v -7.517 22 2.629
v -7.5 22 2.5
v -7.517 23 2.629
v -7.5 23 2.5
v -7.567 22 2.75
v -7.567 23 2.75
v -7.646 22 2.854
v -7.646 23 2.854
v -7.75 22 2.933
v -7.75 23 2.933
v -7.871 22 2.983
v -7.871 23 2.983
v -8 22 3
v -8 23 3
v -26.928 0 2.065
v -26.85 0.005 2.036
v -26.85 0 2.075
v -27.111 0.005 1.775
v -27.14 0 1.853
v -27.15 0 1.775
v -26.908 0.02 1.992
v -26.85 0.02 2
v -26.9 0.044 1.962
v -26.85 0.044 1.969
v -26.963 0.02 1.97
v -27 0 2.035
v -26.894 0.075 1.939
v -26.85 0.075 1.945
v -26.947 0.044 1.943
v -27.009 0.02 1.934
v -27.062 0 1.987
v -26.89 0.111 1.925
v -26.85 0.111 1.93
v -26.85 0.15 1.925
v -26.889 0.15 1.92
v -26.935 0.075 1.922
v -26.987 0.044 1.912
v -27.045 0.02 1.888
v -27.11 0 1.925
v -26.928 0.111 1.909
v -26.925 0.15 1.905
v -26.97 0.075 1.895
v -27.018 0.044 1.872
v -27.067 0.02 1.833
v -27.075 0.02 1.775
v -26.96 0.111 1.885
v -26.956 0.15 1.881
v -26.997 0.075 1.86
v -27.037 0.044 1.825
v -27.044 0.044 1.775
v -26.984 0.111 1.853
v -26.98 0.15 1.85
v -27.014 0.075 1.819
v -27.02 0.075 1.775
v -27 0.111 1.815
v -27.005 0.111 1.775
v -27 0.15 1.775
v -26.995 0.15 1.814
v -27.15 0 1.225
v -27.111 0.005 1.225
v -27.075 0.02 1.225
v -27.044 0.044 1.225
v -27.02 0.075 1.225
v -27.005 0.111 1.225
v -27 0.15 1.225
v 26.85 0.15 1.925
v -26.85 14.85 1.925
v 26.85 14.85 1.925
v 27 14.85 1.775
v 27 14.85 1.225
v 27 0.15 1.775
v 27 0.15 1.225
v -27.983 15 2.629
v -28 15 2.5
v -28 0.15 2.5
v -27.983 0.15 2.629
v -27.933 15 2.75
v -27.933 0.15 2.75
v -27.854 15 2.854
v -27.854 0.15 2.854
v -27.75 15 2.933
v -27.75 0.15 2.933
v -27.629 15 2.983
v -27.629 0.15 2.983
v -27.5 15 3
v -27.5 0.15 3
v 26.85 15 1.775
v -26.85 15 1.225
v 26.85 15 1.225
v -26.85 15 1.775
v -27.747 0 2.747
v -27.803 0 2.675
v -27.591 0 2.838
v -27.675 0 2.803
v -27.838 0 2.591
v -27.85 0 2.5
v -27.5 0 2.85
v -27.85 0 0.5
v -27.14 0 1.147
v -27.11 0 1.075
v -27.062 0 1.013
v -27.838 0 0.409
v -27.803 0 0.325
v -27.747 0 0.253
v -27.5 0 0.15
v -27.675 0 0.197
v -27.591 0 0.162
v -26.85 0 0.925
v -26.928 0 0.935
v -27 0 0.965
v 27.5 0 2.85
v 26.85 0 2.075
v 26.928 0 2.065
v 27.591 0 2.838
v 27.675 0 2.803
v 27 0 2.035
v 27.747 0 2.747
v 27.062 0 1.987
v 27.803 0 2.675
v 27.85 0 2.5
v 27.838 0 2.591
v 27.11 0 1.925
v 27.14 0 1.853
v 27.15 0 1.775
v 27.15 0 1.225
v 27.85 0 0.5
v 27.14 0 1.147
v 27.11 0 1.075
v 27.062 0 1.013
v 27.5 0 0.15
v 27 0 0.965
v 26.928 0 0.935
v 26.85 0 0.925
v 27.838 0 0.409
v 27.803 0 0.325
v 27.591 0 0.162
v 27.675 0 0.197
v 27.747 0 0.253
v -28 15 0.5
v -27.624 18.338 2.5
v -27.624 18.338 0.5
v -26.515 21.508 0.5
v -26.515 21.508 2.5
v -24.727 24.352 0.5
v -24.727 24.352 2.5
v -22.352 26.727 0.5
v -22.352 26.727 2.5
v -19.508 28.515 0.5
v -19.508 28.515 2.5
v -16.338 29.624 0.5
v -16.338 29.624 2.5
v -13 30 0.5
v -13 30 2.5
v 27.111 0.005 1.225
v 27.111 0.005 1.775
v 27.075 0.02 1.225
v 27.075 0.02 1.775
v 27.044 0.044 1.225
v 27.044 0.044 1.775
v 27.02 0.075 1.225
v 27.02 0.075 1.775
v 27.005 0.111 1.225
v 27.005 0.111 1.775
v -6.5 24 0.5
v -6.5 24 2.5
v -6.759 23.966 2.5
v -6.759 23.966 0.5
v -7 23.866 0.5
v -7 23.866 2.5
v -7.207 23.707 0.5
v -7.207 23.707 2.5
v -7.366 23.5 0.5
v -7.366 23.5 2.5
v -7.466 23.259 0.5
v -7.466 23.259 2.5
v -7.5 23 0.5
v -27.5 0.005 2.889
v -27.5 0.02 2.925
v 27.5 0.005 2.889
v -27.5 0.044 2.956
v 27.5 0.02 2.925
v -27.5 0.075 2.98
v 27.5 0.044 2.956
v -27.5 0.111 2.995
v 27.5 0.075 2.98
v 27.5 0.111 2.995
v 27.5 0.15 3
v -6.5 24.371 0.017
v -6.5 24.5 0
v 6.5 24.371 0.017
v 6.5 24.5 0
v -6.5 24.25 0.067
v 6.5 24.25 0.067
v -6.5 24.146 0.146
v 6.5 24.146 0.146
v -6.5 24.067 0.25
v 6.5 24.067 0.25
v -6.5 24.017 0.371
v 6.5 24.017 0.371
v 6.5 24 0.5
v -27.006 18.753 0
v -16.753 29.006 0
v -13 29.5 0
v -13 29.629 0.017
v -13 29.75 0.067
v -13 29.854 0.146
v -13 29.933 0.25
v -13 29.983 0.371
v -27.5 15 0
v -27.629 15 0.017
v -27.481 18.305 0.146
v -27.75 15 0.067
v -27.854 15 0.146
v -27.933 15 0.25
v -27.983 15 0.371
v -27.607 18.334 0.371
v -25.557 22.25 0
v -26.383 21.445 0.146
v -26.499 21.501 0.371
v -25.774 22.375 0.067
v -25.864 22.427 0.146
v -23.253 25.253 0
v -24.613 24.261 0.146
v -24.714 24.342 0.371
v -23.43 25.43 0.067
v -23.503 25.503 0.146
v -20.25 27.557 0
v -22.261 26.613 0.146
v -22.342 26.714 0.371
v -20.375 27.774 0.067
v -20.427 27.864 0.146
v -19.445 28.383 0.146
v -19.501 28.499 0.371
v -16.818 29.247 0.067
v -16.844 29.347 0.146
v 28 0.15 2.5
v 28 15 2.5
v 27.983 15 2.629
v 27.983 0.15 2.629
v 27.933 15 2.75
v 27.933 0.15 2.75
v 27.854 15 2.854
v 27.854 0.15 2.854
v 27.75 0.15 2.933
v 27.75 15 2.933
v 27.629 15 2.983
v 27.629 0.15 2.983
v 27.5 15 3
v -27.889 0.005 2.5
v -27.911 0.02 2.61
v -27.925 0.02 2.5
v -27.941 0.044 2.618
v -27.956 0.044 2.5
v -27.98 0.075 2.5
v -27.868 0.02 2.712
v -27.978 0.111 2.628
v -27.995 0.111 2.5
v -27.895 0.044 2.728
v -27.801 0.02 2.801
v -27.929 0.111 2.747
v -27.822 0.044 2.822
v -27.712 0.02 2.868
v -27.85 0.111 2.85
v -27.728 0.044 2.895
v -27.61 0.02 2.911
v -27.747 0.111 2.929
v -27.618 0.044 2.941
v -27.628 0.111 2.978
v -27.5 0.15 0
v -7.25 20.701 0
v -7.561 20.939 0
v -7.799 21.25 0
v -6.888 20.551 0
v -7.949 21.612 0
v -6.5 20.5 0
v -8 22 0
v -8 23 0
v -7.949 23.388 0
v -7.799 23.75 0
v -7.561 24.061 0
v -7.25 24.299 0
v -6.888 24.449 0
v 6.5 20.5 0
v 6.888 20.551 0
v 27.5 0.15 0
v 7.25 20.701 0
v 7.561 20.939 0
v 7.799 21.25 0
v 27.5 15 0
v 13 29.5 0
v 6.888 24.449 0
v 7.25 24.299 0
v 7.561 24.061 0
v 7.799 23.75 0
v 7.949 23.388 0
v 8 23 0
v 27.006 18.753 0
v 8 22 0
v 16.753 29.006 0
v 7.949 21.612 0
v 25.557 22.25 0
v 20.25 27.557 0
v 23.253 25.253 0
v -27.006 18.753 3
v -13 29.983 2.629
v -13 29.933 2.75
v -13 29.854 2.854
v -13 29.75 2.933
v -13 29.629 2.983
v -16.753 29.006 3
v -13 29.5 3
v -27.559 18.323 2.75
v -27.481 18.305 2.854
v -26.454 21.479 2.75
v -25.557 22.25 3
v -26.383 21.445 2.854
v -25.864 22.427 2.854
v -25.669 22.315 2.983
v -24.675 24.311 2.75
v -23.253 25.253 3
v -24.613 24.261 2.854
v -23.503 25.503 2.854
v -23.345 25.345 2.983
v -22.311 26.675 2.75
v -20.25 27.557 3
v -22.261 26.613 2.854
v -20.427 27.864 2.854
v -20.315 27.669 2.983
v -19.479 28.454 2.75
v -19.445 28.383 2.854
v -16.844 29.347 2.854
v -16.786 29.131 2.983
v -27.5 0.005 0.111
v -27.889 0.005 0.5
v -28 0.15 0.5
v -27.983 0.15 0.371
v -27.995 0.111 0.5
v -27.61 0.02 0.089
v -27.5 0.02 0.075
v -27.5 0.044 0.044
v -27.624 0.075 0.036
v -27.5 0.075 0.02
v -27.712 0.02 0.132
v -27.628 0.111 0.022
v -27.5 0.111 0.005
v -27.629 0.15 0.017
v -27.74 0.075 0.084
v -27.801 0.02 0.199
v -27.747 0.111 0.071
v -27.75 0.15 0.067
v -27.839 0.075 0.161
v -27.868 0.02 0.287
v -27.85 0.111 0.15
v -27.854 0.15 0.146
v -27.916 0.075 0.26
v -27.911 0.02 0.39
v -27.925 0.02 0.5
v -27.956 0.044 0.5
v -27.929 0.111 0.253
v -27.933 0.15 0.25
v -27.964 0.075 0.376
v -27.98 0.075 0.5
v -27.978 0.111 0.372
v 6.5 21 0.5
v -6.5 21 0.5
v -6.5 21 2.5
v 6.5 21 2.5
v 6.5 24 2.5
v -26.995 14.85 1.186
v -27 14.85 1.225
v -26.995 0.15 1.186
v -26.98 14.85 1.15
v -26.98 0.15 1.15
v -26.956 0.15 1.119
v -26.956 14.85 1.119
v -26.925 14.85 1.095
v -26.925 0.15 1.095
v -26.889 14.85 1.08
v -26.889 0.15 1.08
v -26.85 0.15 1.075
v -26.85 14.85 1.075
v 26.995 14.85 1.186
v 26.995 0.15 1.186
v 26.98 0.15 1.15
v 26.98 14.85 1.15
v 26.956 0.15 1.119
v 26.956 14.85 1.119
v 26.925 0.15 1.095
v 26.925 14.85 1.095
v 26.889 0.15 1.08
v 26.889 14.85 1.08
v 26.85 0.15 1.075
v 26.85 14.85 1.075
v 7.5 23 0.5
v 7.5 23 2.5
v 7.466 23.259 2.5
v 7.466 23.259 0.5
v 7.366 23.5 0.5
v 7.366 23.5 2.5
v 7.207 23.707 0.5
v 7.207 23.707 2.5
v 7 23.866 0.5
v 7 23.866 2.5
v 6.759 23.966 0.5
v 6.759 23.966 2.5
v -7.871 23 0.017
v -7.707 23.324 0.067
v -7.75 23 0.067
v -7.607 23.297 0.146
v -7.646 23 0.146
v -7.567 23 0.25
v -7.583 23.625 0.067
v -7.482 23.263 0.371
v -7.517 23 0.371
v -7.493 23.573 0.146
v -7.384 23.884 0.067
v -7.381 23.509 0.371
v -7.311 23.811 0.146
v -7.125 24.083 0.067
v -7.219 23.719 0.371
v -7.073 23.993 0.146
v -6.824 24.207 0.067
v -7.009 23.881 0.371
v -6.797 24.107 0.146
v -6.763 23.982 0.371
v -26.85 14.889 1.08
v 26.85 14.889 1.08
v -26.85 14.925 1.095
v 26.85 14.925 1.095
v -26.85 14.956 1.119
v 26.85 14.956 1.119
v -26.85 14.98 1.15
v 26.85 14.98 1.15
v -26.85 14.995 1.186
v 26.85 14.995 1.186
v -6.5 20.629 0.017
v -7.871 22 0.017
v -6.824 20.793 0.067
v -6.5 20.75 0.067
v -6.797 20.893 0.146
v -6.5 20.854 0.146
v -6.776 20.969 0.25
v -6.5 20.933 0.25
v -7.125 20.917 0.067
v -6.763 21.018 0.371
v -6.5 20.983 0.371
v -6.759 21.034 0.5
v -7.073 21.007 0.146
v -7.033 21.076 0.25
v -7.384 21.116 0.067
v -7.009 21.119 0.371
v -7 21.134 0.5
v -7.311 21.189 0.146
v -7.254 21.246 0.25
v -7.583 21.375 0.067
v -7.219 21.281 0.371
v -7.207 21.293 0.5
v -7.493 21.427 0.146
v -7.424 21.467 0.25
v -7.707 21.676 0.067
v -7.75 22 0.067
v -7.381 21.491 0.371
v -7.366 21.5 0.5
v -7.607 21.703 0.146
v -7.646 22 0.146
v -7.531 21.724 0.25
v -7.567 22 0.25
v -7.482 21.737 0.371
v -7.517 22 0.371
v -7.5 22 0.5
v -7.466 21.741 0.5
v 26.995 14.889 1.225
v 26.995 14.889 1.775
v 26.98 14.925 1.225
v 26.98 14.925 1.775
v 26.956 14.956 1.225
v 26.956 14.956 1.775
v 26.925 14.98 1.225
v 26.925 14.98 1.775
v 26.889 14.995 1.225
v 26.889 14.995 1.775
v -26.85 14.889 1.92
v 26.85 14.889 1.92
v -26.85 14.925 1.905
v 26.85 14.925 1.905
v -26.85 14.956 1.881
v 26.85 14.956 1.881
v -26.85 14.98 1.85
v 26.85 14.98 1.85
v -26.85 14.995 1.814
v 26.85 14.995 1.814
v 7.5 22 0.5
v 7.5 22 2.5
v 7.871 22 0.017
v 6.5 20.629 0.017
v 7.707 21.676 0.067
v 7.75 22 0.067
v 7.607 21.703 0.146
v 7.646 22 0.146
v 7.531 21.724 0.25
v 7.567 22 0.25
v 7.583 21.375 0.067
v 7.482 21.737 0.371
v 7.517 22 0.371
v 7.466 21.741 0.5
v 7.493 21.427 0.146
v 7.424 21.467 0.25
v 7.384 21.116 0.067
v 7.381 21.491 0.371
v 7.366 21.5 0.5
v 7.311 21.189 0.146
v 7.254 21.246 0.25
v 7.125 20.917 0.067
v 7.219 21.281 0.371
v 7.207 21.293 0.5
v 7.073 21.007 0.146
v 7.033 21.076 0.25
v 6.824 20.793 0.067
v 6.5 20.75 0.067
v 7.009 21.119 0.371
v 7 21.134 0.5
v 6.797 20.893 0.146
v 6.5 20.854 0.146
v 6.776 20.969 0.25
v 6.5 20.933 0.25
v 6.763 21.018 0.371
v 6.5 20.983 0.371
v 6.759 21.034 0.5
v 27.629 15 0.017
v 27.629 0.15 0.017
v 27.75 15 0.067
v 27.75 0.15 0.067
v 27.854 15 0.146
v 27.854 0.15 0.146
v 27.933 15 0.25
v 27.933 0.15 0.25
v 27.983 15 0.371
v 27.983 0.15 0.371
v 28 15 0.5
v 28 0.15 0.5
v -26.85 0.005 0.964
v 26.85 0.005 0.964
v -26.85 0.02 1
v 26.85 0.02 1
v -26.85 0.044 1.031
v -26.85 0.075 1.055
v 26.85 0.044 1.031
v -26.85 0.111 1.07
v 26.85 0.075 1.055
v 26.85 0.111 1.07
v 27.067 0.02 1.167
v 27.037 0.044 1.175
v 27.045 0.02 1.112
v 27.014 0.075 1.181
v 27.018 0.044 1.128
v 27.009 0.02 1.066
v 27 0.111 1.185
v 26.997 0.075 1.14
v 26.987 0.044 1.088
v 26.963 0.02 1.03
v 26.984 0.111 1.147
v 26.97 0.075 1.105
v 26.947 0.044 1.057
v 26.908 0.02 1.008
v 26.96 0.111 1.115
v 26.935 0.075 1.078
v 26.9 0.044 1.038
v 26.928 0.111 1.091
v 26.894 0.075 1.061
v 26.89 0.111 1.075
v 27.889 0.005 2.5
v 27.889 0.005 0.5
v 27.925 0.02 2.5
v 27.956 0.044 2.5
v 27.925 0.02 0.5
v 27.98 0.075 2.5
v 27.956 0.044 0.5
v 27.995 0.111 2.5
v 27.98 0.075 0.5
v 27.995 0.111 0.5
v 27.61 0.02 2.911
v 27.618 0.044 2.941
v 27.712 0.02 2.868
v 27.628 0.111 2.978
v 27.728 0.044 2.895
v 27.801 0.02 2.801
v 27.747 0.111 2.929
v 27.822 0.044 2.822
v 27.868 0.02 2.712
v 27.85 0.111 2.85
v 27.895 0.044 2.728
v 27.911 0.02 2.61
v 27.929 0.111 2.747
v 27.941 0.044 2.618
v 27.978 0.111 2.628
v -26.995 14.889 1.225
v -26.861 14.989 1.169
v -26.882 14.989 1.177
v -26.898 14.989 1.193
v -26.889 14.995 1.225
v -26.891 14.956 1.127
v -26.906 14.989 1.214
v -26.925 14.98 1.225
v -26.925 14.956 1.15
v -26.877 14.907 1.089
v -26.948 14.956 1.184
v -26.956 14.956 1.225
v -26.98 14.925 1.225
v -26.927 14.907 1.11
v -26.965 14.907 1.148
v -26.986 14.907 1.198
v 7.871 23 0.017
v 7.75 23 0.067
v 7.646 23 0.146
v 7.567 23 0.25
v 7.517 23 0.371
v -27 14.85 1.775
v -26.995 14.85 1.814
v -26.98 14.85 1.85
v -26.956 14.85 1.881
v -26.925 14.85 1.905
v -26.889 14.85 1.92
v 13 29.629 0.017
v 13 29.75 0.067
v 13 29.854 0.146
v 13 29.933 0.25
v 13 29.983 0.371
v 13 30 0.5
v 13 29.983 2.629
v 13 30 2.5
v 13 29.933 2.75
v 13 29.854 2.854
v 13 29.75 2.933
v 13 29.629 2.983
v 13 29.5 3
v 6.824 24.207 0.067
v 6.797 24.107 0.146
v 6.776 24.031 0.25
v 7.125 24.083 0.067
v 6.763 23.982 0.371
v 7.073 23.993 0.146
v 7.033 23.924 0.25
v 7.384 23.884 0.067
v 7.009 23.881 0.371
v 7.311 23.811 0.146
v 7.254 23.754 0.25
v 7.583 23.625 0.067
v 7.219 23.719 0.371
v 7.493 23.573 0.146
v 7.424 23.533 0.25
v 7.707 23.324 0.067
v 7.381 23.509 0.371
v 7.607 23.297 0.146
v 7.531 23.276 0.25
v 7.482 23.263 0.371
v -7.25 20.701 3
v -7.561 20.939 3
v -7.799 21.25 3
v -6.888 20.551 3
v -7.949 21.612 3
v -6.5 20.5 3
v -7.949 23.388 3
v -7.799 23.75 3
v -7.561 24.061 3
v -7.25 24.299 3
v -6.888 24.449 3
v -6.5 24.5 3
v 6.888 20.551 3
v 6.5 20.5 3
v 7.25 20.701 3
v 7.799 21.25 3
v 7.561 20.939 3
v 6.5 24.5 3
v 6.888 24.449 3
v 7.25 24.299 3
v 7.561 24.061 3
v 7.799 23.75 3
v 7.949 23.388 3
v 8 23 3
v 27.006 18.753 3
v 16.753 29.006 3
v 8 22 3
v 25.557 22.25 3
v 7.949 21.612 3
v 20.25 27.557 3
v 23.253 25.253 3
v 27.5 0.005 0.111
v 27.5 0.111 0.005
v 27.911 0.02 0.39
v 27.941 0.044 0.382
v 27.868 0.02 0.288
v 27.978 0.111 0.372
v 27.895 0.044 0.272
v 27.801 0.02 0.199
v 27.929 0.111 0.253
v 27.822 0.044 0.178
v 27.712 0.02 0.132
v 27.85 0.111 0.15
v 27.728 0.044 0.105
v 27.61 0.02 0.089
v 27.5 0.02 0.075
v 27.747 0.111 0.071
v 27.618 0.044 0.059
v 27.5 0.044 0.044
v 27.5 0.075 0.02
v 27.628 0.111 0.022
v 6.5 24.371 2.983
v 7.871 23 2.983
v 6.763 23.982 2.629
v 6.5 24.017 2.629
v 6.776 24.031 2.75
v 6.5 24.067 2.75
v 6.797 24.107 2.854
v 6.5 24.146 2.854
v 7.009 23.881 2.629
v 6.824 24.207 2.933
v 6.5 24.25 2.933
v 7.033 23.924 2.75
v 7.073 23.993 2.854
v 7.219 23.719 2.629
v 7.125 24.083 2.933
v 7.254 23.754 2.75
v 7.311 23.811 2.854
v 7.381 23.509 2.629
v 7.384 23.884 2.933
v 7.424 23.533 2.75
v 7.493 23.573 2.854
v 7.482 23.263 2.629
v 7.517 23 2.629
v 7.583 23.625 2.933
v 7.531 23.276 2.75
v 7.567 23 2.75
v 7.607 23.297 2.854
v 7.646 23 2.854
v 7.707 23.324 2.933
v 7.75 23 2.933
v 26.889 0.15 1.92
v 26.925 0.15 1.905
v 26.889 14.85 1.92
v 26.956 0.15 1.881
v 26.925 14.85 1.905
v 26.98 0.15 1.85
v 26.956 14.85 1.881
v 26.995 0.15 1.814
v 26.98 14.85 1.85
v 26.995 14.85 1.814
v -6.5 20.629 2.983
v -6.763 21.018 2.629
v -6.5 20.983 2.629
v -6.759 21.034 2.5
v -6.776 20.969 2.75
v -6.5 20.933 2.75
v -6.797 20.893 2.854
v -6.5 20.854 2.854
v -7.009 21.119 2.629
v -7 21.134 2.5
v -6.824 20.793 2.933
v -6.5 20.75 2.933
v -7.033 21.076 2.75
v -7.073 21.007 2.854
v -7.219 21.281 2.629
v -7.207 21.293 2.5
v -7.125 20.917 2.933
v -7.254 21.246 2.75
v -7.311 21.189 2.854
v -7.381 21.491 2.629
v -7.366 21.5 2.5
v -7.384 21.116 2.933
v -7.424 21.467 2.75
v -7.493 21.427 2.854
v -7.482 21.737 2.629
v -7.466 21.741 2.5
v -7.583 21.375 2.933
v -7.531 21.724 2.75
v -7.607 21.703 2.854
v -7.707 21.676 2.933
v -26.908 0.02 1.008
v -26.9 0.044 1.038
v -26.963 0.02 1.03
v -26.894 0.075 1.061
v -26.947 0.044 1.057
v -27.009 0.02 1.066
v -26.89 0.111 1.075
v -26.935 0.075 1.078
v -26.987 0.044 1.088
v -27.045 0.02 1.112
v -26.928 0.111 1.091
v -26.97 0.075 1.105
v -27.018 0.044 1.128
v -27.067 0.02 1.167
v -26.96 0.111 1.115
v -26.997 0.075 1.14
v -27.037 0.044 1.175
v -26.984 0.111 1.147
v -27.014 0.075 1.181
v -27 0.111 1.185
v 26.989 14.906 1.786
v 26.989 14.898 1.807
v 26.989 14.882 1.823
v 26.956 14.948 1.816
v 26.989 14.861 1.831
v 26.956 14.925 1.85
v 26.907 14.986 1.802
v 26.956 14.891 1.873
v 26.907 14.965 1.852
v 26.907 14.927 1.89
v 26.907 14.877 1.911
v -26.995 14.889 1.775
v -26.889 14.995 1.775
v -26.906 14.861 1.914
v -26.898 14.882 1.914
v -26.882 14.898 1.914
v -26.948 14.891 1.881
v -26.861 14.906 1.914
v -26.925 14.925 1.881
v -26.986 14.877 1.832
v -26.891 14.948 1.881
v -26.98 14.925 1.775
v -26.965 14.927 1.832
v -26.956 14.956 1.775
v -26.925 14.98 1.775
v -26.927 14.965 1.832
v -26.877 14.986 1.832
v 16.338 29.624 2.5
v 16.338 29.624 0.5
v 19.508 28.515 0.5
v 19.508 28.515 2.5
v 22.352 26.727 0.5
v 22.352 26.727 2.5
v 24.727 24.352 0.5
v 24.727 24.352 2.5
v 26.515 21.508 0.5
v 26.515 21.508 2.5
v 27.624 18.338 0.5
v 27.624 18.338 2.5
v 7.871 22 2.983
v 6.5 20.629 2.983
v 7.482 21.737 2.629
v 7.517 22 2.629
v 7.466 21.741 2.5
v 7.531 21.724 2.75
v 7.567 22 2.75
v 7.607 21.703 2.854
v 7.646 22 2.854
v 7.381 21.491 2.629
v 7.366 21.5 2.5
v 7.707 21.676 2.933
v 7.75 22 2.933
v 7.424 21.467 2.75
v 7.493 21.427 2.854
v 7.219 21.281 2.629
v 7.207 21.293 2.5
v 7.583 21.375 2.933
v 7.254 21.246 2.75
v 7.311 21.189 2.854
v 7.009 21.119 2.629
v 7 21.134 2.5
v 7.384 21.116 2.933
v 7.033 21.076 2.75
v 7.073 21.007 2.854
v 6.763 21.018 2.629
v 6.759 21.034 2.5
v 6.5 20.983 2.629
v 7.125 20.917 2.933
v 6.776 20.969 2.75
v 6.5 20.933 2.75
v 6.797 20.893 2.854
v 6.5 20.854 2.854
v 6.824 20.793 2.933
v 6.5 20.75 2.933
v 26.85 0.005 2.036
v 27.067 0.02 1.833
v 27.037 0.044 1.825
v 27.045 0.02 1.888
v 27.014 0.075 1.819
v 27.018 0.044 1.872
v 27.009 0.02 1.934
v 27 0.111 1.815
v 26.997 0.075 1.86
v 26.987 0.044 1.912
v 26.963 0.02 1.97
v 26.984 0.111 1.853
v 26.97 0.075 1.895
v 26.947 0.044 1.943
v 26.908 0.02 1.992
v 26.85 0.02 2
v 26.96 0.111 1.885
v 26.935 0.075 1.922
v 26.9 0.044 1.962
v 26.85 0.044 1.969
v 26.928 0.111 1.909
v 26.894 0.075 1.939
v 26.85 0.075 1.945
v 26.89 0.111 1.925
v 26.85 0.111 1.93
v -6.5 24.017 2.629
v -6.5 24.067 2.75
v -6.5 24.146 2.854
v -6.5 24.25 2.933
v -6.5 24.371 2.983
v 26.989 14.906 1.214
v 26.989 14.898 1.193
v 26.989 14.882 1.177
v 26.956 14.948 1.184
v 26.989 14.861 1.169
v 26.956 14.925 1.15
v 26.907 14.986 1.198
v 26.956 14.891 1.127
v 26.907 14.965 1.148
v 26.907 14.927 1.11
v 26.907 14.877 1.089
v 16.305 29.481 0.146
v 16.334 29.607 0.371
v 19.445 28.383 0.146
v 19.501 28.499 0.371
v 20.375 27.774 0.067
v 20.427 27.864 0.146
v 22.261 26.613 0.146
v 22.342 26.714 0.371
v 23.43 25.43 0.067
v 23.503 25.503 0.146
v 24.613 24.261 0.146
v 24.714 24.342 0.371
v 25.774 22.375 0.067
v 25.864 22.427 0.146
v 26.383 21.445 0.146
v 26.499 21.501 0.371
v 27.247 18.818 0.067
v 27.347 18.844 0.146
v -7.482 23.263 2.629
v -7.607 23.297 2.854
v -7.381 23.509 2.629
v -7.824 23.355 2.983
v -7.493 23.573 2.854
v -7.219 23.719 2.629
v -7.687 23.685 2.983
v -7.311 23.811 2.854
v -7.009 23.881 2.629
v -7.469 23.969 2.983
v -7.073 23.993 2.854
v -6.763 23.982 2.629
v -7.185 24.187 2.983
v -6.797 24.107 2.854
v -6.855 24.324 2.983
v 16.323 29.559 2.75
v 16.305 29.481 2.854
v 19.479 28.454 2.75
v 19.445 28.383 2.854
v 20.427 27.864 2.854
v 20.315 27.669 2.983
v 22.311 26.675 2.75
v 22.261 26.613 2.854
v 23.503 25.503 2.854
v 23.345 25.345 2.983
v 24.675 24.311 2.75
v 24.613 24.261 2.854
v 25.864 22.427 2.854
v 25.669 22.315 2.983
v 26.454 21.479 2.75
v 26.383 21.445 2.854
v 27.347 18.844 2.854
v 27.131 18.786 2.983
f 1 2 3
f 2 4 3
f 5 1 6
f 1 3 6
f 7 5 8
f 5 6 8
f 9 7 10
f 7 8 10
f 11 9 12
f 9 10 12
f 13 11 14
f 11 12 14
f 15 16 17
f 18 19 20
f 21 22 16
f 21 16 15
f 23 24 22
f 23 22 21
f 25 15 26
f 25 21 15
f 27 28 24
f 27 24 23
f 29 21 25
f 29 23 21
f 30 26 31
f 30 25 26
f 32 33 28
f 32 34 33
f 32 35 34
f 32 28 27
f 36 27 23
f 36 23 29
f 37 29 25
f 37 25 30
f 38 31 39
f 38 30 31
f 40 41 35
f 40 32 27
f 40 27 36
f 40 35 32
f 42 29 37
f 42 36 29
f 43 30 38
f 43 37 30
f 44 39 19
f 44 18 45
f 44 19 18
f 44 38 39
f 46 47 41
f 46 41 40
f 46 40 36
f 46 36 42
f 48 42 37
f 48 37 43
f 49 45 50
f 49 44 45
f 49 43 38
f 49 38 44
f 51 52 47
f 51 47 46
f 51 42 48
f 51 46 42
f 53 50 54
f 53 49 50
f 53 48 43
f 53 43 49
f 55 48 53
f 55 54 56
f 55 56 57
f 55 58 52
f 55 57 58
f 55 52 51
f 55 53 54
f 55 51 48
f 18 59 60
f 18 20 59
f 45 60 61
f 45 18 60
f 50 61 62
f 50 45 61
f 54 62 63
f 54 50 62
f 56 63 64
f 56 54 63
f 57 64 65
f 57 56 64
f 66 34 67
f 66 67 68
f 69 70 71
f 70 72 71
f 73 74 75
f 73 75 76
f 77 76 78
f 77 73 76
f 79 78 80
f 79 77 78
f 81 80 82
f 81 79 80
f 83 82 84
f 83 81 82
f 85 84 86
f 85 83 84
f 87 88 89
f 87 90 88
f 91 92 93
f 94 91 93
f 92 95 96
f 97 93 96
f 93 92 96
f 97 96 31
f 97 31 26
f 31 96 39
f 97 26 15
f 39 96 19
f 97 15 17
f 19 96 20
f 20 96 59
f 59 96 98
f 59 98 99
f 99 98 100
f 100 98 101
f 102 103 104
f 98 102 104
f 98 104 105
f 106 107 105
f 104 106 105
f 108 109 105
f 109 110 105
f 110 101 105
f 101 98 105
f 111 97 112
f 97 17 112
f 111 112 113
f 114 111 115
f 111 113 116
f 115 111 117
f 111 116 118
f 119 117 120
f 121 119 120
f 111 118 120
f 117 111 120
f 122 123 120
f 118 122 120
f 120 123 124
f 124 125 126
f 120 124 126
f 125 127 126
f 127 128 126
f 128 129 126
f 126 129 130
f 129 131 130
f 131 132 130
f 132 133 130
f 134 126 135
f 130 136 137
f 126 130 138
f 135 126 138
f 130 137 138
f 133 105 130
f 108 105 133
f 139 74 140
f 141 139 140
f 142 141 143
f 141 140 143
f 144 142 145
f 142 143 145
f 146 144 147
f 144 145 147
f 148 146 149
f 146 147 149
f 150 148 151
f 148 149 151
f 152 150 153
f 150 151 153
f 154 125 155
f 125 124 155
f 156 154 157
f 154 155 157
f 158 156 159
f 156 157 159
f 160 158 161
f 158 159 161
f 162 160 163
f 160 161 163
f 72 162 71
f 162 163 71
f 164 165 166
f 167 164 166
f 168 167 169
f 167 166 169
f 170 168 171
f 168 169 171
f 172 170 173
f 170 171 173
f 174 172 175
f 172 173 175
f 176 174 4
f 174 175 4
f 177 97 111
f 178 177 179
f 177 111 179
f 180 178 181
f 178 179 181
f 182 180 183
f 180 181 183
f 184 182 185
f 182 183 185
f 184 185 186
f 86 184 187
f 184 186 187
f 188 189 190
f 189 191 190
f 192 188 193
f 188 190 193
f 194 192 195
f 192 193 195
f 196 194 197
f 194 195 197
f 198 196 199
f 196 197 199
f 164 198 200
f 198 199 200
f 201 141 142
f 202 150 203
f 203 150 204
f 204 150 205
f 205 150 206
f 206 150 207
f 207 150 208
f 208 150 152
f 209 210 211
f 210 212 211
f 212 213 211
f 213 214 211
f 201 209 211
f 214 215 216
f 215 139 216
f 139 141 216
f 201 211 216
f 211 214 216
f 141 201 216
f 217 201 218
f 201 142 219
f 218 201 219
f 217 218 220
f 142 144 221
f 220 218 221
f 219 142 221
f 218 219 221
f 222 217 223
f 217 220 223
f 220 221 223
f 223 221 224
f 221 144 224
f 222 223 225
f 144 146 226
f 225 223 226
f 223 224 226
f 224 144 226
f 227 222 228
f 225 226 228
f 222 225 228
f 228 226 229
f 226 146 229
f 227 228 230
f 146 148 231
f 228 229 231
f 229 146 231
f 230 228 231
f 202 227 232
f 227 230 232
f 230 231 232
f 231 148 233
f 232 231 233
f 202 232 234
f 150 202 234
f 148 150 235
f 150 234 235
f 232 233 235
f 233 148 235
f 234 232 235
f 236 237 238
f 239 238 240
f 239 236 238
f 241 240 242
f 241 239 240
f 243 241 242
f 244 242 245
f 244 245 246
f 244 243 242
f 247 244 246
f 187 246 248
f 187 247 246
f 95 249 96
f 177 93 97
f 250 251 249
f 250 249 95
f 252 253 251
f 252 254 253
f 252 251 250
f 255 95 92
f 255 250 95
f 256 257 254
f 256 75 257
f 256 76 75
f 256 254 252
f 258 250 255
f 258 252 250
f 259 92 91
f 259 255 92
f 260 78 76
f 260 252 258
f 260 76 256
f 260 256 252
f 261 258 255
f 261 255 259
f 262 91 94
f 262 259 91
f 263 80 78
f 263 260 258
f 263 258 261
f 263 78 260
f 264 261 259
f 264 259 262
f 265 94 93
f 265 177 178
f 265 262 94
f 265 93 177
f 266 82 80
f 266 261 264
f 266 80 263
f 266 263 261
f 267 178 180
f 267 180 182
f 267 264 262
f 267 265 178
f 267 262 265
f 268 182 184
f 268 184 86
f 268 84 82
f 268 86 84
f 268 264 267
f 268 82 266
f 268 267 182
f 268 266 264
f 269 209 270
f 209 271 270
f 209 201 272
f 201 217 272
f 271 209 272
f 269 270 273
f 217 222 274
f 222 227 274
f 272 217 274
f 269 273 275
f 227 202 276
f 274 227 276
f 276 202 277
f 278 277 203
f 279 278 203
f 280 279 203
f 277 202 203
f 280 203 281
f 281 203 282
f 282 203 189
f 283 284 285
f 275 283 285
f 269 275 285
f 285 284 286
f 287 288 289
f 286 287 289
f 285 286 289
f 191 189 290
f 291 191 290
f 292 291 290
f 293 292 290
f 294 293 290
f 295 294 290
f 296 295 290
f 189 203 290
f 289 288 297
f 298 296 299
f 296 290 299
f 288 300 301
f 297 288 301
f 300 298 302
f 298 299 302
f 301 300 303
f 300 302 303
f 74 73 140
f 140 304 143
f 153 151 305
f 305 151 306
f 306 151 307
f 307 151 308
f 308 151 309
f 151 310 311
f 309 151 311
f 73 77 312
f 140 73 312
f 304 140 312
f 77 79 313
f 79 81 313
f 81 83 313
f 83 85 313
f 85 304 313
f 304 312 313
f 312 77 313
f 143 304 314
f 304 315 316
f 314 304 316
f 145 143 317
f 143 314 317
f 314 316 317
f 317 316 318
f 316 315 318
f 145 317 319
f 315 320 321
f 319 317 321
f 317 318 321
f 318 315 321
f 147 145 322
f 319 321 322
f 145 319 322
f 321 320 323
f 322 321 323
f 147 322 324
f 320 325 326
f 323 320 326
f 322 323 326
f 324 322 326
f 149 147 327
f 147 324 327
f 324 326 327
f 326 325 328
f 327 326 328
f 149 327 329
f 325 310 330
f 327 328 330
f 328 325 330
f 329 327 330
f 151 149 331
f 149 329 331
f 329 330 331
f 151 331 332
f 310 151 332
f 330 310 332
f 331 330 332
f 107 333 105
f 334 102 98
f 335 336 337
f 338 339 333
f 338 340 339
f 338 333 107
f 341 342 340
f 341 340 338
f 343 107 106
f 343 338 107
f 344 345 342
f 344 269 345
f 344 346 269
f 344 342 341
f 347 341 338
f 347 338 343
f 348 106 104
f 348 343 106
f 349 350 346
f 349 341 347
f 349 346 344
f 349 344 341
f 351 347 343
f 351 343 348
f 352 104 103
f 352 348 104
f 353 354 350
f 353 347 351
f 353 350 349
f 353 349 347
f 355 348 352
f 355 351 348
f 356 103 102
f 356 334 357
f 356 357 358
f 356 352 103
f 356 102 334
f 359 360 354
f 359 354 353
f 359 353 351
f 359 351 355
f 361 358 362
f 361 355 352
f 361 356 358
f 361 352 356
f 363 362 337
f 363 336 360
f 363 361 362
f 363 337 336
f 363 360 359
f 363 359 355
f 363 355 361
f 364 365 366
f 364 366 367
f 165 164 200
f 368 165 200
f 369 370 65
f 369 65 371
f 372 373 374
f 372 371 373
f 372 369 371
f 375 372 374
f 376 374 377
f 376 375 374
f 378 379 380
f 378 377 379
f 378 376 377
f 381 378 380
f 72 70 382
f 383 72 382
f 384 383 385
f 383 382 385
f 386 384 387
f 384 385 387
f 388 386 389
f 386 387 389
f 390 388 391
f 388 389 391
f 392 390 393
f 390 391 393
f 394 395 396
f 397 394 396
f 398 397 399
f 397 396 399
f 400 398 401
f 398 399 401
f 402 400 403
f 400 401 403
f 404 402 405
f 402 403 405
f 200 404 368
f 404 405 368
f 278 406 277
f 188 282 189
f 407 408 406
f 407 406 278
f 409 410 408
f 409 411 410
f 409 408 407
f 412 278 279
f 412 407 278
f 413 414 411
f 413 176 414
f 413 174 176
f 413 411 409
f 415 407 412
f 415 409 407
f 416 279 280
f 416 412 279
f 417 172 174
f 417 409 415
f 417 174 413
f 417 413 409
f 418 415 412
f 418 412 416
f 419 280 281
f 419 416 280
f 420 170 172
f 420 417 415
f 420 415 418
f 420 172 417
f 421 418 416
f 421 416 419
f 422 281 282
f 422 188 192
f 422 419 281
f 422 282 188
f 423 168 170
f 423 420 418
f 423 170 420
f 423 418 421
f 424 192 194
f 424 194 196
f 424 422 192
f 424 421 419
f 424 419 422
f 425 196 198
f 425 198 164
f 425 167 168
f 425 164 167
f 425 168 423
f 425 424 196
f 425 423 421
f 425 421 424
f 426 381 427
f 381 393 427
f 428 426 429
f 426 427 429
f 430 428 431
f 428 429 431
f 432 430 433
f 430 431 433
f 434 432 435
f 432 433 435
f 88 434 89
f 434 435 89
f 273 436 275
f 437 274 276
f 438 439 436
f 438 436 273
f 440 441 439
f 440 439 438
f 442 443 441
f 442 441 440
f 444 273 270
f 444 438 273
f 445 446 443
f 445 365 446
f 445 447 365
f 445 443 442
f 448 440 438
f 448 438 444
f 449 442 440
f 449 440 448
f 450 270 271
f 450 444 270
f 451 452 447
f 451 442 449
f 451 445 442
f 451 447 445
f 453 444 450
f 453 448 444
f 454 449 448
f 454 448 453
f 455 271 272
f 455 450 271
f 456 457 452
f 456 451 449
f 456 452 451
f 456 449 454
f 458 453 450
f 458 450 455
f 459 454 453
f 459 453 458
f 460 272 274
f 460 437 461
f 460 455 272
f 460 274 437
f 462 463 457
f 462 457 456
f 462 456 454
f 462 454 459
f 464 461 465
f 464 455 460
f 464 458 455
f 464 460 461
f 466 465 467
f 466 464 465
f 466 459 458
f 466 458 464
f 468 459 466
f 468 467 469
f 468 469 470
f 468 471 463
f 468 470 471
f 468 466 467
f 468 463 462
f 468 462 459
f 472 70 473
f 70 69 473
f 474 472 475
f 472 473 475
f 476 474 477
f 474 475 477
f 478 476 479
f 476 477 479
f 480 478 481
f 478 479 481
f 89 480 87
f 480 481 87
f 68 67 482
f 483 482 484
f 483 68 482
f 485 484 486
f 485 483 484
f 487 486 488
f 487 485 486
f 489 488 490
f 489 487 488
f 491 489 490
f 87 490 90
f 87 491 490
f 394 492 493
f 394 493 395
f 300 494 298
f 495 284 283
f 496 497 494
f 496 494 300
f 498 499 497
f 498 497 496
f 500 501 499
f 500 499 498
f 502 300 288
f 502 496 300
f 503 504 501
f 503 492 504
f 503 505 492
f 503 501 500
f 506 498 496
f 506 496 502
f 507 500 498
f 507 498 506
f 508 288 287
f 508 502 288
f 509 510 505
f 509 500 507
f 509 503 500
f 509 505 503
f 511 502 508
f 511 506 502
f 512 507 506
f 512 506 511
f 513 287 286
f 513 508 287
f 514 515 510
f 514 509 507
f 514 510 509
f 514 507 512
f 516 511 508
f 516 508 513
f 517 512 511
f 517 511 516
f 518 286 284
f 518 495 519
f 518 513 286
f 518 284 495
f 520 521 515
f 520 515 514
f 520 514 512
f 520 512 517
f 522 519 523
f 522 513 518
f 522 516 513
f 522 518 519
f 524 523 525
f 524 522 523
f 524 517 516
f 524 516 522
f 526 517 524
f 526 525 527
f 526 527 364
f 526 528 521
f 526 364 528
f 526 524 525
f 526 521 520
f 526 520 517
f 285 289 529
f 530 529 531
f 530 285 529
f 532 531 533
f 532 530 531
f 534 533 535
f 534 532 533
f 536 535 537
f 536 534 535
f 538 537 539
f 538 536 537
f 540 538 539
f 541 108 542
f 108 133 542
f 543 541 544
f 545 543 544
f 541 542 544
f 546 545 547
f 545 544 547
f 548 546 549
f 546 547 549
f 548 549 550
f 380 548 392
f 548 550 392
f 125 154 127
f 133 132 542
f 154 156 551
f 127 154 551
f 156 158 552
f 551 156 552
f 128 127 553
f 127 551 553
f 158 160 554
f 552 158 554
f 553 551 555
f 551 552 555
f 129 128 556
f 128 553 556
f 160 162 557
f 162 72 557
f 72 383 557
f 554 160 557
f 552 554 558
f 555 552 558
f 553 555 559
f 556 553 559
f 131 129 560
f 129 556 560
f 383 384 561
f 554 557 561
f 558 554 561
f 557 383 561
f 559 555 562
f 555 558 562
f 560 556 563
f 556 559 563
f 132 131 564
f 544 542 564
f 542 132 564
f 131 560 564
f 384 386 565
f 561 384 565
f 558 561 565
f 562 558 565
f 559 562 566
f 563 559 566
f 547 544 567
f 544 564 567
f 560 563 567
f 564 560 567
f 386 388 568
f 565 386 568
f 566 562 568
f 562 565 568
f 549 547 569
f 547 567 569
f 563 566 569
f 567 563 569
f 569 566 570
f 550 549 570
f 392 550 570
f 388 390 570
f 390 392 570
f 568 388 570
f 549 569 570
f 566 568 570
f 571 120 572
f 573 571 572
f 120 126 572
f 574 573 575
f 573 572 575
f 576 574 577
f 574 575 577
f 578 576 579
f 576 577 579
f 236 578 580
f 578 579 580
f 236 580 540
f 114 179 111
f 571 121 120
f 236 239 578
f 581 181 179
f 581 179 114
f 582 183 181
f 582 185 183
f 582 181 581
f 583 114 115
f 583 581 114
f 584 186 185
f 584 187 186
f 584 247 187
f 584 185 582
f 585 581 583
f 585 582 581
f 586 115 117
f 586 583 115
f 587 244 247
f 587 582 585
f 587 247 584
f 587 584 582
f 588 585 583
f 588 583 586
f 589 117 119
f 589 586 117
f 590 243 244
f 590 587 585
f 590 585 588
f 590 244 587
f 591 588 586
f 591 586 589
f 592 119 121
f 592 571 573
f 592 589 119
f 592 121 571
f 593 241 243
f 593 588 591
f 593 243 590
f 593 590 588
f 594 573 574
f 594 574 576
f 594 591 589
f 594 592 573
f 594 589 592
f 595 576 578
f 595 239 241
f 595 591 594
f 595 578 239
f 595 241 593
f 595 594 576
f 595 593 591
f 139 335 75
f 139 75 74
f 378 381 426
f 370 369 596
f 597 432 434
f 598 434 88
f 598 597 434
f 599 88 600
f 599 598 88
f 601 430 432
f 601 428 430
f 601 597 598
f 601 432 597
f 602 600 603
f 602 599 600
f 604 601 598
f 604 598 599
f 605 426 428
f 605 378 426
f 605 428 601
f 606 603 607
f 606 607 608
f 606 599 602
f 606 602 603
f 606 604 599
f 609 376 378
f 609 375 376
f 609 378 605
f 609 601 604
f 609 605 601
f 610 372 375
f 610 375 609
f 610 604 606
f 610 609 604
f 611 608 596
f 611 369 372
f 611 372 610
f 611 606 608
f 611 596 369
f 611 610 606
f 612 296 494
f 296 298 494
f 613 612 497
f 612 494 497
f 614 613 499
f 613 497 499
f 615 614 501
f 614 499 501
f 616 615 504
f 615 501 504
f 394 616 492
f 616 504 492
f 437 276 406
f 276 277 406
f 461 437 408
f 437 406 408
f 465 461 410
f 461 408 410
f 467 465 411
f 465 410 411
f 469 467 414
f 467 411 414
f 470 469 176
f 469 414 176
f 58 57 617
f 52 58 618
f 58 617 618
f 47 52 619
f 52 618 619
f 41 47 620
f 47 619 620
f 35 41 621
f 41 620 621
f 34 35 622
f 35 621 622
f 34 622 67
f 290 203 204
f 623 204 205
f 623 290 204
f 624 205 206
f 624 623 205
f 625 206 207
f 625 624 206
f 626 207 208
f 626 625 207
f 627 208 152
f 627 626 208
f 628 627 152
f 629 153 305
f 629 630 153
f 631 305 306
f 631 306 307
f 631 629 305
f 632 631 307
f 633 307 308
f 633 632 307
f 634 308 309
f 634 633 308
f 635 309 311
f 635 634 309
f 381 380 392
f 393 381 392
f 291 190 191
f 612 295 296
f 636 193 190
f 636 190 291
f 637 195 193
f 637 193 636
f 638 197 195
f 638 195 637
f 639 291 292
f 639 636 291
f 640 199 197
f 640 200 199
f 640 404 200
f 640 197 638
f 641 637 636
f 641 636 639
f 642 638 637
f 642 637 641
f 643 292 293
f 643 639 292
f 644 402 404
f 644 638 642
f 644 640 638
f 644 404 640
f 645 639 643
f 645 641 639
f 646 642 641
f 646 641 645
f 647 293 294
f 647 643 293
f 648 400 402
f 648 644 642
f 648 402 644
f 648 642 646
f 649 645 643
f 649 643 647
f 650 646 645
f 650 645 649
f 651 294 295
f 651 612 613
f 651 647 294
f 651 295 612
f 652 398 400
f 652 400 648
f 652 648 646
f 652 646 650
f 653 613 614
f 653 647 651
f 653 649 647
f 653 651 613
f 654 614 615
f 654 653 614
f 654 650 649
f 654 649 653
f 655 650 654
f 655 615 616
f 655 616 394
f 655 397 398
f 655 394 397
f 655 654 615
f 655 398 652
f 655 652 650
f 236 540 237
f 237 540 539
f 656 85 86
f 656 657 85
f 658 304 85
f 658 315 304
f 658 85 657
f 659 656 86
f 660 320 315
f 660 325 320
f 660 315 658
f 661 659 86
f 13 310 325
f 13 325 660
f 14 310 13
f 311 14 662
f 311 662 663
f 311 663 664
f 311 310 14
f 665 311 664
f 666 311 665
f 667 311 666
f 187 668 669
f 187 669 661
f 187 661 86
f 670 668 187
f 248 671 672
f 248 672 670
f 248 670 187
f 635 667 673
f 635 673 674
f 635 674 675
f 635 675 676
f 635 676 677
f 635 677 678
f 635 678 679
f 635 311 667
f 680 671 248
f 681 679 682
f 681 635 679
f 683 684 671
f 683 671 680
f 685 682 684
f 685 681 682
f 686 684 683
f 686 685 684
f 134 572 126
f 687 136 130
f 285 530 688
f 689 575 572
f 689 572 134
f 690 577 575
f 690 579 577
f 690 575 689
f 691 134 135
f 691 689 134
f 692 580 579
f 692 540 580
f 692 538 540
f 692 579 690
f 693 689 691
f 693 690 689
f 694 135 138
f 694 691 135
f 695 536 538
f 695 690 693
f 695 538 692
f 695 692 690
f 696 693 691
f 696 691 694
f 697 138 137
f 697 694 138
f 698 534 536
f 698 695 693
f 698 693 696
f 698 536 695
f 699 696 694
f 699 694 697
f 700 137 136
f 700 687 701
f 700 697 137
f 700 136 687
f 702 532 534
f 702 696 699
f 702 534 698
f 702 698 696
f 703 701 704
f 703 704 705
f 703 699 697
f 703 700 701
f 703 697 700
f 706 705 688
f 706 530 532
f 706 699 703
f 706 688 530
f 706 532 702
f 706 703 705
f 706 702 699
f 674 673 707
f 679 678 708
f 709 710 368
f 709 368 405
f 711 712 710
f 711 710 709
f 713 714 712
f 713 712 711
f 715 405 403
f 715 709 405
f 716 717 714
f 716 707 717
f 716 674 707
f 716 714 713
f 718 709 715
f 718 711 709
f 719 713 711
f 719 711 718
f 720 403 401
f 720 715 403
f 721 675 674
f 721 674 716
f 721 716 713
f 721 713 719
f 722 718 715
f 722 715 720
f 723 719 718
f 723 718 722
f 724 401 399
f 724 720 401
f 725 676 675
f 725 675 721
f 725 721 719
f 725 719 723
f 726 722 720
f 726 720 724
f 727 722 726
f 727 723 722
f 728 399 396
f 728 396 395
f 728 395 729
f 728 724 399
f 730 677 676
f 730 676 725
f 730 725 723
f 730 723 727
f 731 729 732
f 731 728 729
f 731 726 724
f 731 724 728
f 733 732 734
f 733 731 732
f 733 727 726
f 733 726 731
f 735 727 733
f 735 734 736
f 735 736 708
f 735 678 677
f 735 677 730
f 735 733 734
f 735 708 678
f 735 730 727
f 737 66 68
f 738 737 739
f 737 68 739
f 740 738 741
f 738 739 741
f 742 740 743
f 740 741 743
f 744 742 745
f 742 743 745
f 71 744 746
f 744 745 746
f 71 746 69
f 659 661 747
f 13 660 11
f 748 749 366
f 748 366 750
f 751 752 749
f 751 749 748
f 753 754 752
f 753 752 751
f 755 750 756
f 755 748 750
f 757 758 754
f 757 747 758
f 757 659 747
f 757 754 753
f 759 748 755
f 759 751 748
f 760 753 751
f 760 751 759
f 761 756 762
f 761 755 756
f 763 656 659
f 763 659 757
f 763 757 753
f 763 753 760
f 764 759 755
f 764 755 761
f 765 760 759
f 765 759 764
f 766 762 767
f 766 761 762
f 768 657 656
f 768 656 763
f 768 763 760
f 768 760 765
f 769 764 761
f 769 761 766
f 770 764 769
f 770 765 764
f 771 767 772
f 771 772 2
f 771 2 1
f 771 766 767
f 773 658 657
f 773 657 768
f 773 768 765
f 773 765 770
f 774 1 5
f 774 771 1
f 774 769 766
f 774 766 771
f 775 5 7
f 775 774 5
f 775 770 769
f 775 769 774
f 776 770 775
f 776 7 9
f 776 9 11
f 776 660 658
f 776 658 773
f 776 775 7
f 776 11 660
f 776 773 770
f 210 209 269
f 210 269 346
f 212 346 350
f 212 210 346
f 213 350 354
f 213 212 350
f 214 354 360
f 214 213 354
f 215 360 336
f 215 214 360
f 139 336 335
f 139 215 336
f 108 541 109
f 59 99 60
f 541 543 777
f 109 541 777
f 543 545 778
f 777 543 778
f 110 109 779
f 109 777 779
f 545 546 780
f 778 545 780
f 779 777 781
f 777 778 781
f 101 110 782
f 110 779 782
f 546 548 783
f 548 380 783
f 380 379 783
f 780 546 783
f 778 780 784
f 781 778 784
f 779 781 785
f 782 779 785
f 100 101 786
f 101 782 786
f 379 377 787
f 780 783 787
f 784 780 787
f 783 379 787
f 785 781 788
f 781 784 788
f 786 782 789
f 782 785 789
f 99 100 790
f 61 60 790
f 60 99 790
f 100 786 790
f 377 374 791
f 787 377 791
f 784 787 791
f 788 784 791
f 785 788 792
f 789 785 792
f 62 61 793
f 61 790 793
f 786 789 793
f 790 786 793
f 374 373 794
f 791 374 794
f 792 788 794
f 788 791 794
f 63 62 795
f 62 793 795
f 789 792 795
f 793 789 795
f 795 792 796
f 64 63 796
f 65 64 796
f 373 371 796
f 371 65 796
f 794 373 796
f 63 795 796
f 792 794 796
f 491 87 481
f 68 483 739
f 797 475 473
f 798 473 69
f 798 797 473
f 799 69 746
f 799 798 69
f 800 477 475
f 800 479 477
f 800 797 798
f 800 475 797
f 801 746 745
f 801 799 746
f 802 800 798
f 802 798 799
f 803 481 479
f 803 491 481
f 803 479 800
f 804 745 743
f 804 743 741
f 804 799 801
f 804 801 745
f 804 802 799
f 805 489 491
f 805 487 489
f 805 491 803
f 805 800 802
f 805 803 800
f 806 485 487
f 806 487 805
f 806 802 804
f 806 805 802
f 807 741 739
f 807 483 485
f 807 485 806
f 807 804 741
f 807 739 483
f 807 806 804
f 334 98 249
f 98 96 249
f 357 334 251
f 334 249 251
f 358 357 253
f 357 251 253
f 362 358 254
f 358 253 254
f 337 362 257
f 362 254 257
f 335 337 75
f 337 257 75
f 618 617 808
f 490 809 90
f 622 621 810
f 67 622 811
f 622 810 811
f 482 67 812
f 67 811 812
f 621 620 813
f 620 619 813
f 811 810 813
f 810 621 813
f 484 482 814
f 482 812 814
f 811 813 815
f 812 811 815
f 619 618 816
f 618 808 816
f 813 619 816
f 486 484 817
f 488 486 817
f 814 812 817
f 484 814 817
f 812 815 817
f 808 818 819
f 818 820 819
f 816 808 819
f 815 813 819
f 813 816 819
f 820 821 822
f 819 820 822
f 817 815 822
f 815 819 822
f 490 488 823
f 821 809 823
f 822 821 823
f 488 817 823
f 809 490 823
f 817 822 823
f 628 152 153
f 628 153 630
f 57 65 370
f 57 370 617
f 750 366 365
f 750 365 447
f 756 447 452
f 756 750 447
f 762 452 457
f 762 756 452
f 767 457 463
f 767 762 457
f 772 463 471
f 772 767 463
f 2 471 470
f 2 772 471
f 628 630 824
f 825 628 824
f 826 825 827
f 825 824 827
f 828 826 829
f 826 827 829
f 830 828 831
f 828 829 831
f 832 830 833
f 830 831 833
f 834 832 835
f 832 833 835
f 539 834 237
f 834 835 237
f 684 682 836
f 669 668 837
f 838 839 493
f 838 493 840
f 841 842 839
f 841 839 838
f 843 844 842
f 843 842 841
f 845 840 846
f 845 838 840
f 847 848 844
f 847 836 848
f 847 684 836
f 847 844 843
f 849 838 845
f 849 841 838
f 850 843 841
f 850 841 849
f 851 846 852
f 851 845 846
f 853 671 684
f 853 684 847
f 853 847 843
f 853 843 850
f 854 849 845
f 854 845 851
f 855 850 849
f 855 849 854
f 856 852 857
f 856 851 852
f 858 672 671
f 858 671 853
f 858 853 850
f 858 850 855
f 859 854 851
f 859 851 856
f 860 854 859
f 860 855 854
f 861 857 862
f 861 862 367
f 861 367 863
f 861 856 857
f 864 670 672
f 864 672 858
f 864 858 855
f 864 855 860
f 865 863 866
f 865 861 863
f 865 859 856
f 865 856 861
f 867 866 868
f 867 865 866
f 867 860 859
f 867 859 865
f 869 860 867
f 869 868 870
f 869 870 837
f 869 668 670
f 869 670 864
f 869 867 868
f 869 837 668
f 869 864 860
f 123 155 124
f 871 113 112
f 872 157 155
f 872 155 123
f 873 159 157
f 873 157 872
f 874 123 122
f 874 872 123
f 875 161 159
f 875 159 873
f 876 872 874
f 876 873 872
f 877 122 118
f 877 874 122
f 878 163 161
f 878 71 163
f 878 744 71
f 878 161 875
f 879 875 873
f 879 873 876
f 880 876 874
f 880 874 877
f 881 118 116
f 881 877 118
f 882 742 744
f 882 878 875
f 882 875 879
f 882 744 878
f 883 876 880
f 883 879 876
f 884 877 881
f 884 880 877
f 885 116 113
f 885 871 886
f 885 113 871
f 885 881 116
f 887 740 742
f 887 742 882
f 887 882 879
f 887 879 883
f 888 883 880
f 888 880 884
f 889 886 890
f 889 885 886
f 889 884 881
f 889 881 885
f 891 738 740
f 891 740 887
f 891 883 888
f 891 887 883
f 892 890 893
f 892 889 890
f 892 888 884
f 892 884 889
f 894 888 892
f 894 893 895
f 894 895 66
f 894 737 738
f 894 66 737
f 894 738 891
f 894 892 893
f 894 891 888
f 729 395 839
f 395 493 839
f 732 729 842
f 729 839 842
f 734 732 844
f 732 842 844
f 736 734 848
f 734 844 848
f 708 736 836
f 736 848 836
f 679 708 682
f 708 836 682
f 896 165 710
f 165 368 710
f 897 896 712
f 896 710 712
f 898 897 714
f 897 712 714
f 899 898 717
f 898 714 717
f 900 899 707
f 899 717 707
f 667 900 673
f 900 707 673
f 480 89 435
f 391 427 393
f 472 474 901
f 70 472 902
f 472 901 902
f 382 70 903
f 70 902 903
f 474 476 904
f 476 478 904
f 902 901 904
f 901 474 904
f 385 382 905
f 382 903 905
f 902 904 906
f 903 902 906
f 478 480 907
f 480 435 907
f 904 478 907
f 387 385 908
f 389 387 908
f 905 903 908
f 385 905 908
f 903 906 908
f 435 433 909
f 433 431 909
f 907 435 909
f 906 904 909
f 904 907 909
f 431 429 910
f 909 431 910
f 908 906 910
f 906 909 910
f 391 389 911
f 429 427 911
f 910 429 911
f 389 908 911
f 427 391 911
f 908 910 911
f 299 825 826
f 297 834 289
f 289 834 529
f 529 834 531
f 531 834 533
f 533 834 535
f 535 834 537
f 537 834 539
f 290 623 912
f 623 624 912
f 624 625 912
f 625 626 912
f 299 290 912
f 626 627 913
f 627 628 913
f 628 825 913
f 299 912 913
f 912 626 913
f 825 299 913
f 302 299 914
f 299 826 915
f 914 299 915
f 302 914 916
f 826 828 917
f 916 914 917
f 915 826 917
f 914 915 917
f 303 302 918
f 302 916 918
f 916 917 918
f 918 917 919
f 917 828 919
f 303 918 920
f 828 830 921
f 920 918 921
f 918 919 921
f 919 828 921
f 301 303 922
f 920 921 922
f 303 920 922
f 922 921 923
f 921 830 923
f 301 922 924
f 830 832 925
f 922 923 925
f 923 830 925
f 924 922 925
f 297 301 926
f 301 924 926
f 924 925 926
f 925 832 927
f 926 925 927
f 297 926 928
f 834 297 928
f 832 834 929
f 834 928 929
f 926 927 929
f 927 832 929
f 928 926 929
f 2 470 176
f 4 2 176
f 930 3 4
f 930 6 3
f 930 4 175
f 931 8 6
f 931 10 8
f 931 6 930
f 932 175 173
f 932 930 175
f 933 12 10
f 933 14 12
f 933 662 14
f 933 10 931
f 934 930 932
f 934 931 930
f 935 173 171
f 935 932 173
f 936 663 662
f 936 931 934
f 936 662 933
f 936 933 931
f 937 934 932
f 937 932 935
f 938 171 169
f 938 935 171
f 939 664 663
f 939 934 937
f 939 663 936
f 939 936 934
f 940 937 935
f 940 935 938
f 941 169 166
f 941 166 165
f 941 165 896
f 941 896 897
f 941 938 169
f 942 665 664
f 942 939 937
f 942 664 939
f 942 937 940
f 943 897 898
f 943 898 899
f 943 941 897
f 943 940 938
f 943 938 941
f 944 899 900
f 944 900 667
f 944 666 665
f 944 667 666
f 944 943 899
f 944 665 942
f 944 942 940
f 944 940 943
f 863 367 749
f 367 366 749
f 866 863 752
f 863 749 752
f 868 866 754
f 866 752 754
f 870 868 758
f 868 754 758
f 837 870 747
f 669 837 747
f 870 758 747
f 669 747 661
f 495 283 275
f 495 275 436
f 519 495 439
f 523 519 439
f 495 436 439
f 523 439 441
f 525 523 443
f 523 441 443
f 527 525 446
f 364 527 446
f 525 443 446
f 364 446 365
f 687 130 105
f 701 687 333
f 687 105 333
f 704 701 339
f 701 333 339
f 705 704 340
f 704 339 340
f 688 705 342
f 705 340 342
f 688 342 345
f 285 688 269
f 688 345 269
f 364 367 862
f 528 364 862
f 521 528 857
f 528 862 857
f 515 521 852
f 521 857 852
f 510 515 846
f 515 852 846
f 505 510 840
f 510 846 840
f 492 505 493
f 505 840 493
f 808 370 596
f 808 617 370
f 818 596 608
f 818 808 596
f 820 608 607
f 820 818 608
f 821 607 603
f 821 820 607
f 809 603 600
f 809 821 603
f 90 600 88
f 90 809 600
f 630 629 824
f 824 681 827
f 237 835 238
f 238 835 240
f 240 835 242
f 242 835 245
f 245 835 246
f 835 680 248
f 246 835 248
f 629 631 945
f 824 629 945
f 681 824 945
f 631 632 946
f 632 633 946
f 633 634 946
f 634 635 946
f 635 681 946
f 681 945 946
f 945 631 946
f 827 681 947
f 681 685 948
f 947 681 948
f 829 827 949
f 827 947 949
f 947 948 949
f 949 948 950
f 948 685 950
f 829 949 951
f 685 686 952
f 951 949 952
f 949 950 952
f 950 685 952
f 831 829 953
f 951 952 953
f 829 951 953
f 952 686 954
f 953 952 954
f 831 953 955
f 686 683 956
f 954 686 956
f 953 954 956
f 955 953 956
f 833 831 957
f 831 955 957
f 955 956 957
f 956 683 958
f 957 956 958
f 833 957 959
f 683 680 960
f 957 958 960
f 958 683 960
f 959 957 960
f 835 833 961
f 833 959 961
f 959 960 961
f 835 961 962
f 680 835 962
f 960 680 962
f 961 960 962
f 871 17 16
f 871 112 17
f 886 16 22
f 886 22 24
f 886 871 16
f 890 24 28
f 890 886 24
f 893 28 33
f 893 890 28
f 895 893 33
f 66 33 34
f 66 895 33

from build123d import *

# Parameters (mm, degrees)
F0_W     = 56
F0_H     = 30
F0_W_2   = 15
F0_H_2   = 3
F1_DEPTH = 3
F2_R     = 15
F3_R     = 1
F4_R     = 0.5
F5_W     = 54
F5_H     = 0.85
F6_DEPTH = 15
F7_R     = 0.15


with BuildPart() as f1:
    # F0 (on Top) → F1 (new body)
    with BuildSketch(Plane.XY):
        with Locations((0, 15)):
            Rectangle(F0_W, F0_H)
        with Locations((0, 22.5)):
            Rectangle(F0_W_2, F0_H_2, mode=Mode.SUBTRACT)
    extrude(amount=F1_DEPTH)

    # F2
    f2_edges = [f1.edges().sort_by_distance(p)[0] for p in [
        (28, 30, 1.5),
        (-28, 30, 1.5),
    ]]
    fillet(f2_edges, radius=F2_R)

    # F3
    f3_edges = [f1.edges().sort_by_distance(p)[0] for p in [
        (-7.5, 24, 1.5),
        (7.5, 21, 1.5),
        (7.5, 24, 1.5),
        (-7.5, 21, 1.5),
    ]]
    fillet(f3_edges, radius=F3_R)

    # F4
    f4_edges = [f1.edges().sort_by_distance(p)[0] for p in [
        (0, 30, 3),
        (0, 30, 0),
        (0, 24, 3),
        (0, 24, 0),
    ]]
    fillet(f4_edges, radius=F4_R)

    # F5 (on face) → F6 (cut)
    with BuildSketch(Plane.XZ):
        with Locations((0, 1.5)):
            Rectangle(F5_W, F5_H)
    extrude(amount=-F6_DEPTH, mode=Mode.SUBTRACT)

    # F7
    f7_edges = [f1.edges().sort_by_distance(p)[0] for p in [
        (-27, 7.5, 1.075),
        (0, 15, 1.075),
        (-27, 15, 1.5),
        (-27, 7.5, 1.925),
        (0, 15, 1.925),
        (27, 15, 1.5),
        (27, 7.5, 1.075),
        (27, 7.5, 1.925),
        (27, 0, 1.5),
        (-28, 0, 1.5),
        (-27.853553, 0, 0.146447),
        (-27.853553, 0, 2.853553),
        (0, 0, 0),
        (0, 0, 3),
        (27.853553, 0, 0.146447),
        (27.853553, 0, 2.853553),
        (28, 0, 1.5),
        (0, 0, 1.925),
        (0, 0, 1.075),
        (-27, 0, 1.5),
    ]]
    fillet(f7_edges, radius=F7_R)


solid = f1.part
